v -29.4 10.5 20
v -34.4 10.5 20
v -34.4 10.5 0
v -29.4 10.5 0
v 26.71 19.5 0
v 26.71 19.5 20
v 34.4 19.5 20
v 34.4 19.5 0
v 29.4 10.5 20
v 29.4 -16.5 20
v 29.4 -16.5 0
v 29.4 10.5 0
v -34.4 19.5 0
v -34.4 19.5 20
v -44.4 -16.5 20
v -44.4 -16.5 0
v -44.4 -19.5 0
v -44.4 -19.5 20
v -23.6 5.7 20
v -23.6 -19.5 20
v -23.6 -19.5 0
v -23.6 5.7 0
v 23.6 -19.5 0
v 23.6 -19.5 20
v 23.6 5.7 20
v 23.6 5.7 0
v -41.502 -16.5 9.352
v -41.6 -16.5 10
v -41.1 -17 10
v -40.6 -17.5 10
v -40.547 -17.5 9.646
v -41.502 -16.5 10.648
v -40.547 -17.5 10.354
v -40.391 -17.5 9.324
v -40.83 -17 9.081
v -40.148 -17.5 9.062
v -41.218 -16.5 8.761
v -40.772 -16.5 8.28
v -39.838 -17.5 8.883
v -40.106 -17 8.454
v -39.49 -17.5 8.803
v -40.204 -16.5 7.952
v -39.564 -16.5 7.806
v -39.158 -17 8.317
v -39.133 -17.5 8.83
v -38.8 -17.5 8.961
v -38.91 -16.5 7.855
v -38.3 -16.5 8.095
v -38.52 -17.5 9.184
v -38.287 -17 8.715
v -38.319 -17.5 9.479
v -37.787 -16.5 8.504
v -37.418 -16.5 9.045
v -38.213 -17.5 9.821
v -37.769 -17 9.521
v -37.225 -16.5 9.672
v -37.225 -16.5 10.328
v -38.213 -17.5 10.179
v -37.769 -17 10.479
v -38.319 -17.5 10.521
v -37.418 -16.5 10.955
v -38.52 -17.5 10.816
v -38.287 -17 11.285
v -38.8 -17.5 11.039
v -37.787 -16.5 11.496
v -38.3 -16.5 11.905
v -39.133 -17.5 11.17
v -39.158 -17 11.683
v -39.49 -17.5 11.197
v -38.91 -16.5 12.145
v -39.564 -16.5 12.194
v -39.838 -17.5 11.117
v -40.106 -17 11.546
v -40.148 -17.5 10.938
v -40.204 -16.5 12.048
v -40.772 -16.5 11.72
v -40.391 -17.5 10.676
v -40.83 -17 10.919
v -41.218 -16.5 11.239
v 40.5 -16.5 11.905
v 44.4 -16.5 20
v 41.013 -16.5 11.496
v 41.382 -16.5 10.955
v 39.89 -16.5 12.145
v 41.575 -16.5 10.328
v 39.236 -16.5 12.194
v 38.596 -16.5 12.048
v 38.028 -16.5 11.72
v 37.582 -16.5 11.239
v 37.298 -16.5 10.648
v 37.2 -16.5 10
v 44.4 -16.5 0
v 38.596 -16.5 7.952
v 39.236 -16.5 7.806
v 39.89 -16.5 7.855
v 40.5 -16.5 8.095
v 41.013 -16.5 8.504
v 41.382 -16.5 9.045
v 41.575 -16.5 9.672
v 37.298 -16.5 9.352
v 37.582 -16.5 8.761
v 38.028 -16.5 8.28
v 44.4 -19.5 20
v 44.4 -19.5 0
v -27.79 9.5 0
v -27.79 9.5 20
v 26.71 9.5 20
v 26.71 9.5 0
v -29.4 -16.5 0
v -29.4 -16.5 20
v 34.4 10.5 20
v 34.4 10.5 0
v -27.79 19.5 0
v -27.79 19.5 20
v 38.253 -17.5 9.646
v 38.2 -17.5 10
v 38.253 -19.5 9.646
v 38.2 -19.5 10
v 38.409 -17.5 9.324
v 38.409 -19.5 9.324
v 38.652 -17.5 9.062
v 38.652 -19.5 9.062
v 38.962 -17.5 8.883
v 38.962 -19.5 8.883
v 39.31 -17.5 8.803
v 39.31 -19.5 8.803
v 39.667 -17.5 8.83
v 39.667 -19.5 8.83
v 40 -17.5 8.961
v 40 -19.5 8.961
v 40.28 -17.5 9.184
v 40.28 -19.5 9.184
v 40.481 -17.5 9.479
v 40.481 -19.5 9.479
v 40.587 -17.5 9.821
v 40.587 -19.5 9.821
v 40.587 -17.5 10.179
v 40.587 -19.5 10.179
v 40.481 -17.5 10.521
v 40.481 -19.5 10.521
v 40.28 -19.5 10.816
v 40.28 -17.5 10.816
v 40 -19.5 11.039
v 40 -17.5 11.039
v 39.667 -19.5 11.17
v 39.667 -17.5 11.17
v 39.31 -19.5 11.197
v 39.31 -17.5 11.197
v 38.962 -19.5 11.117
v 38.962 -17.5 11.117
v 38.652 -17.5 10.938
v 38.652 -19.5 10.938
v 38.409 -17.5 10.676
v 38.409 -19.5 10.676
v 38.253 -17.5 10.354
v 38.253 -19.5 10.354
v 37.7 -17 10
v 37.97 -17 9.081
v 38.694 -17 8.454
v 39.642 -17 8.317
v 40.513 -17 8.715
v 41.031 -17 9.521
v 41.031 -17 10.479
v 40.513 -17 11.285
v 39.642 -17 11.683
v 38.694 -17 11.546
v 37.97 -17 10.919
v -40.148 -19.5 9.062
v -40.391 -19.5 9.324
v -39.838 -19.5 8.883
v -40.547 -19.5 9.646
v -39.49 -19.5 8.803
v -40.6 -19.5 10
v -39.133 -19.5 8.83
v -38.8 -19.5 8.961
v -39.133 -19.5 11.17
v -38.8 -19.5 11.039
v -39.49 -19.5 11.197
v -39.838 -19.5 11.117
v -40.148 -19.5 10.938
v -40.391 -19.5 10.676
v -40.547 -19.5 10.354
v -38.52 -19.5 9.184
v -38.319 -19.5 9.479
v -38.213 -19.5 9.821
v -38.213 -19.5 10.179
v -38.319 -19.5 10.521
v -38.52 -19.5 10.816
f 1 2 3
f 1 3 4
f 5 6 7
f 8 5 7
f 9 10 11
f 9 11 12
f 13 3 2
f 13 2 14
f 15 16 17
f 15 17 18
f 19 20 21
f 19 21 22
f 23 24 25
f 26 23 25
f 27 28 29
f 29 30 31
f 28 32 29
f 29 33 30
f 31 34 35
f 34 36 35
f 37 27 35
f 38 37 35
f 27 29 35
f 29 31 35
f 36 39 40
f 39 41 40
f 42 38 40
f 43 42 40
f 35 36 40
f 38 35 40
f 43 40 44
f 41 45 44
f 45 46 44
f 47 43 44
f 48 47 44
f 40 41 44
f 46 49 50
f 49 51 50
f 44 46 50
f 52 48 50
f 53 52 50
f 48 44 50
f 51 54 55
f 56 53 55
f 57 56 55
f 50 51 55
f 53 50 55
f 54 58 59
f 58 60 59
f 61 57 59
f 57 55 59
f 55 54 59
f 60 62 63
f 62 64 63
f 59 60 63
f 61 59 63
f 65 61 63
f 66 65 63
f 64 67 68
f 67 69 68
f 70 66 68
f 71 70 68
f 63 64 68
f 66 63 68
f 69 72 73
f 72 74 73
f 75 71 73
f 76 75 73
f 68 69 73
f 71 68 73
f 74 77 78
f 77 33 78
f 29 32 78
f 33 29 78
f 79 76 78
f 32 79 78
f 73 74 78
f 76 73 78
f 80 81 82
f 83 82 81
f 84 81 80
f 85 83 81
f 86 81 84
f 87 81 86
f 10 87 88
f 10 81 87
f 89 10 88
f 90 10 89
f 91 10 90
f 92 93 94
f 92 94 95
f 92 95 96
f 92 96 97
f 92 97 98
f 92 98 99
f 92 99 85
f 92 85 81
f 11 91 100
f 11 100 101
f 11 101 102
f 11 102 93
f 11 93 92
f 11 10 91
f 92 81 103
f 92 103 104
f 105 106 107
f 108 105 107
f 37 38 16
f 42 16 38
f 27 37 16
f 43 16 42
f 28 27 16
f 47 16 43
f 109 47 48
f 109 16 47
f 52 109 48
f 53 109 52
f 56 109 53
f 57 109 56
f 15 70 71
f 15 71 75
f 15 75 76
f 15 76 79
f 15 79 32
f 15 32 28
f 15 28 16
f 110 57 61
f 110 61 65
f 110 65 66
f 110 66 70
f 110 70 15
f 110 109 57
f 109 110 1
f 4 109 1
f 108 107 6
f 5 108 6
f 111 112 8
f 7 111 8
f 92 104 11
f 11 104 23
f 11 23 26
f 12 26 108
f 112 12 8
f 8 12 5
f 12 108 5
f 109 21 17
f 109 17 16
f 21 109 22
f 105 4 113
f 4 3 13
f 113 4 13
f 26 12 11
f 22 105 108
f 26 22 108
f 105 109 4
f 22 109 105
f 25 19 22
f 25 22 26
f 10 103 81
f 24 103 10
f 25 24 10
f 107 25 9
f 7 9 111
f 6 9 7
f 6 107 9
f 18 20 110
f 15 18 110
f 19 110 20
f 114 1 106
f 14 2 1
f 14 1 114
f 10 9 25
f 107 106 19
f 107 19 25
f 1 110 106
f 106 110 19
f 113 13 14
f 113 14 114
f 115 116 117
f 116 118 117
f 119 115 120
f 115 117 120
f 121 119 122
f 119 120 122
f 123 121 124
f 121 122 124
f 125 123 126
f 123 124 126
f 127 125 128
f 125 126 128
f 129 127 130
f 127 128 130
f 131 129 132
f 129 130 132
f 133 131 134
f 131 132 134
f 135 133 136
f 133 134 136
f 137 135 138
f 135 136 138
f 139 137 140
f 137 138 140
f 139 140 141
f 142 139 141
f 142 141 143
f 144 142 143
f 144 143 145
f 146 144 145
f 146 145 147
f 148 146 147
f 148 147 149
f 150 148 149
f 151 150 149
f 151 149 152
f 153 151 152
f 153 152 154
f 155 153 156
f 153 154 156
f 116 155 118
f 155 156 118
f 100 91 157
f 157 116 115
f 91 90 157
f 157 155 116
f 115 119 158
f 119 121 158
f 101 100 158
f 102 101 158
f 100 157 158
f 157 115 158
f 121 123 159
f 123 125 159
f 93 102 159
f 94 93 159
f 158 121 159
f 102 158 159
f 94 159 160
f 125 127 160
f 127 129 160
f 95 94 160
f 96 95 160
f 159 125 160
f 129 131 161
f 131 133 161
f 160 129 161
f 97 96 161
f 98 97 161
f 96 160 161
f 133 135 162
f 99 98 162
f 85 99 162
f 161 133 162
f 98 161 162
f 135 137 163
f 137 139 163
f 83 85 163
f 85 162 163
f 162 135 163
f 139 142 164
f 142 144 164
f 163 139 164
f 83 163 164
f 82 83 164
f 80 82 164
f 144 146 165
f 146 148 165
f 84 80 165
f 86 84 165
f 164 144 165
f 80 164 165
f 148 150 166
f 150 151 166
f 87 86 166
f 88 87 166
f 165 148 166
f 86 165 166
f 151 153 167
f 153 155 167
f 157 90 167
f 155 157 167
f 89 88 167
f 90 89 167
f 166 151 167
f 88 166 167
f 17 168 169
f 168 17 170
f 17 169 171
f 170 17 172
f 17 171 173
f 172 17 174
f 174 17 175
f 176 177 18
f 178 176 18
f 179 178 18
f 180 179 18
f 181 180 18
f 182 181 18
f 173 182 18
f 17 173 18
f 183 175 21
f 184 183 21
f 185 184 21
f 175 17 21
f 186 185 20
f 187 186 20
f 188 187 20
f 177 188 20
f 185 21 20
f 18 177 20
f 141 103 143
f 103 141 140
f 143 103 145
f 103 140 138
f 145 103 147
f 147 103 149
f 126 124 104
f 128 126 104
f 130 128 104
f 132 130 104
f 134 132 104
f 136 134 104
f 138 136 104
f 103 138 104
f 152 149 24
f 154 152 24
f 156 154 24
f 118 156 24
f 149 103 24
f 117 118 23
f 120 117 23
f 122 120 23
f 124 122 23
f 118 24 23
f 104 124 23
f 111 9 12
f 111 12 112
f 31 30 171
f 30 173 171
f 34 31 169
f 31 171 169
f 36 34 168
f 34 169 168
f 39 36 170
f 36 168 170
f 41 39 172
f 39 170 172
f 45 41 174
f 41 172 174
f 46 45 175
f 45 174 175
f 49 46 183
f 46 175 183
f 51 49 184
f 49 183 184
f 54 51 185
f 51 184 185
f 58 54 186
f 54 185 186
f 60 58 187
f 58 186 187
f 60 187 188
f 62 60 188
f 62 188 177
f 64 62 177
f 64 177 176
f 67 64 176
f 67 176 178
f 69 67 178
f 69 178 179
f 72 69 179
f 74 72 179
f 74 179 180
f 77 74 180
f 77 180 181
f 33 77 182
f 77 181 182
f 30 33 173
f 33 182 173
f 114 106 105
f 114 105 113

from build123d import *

# Parameters (mm, degrees)
SKETCH1_W                                       = 68.8
SKETCH1_H                                       = 39
BOSS_EXTRUDE1_DEPTH                             = 20
SKETCH2_W                                       = 47.2
SKETCH2_H                                       = 25.2
SKETCH2_W_2                                     = 54.5
SKETCH2_H_2                                     = 10
CUT_EXTRUDE1_DEPTH                              = 50
SKETCH3_W                                       = 5
SKETCH3_H                                       = 30
CUT_EXTRUDE2_DEPTH                              = 50
SKETCH4_W                                       = 20
SKETCH4_H                                       = 3
BOSS_EXTRUDE2_DEPTH                             = 15
SKETCH5_W                                       = 20
SKETCH5_H                                       = 3
BOSS_EXTRUDE3_DEPTH                             = 15
CSK_FOR_M2_FLAT_HEAD_MACHINE_SCREW1_D           = 2.4
CSK_FOR_M2_FLAT_HEAD_MACHINE_SCREW1_CSINK_D     = 4.4
CSK_FOR_M2_FLAT_HEAD_MACHINE_SCREW1_CSINK_ANGLE = 90
CSK_FOR_M2_FLAT_HEAD_MACHINE_SCREW2_D           = 2.4
CSK_FOR_M2_FLAT_HEAD_MACHINE_SCREW2_CSINK_D     = 4.4
CSK_FOR_M2_FLAT_HEAD_MACHINE_SCREW2_CSINK_ANGLE = 90


with BuildPart() as part:
    # Sketch1 → Boss-Extrude1 (new body)
    with BuildSketch(Plane.XY):
        Rectangle(SKETCH1_W, SKETCH1_H)
    extrude(amount=BOSS_EXTRUDE1_DEPTH)

    # Sketch2 → Cut-Extrude1 (cut)
    with BuildSketch(Plane.XY.offset(20)):
        with Locations((0, -6.9)):
            Rectangle(SKETCH2_W, SKETCH2_H)
        with Locations((-0.54, 14.5)):
            Rectangle(SKETCH2_W_2, SKETCH2_H_2)
    extrude(amount=-CUT_EXTRUDE1_DEPTH, mode=Mode.SUBTRACT)

    # Sketch3 → Cut-Extrude2 (cut)
    with BuildSketch(Plane.XY.offset(20)):
        with Locations((-31.9, -4.5)):
            Rectangle(SKETCH3_W, SKETCH3_H)
        with Locations((31.9, -4.5)):
            Rectangle(SKETCH3_W, SKETCH3_H)
    extrude(amount=-CUT_EXTRUDE2_DEPTH, mode=Mode.SUBTRACT)

    # Sketch4 → Boss-Extrude2 (add)
    with BuildSketch(Plane.ZY.offset(29.4)):
        with Locations((10, -18)):
            Rectangle(SKETCH4_W, SKETCH4_H)
    extrude(amount=BOSS_EXTRUDE2_DEPTH)

    # Sketch5 → Boss-Extrude3 (add)
    with BuildSketch(Plane(origin=(29.4, 0, 0), x_dir=(0, 0, -1), z_dir=(1, 0, 0))):
        with Locations((-10, -18)):
            Rectangle(SKETCH5_W, SKETCH5_H)
    extrude(amount=BOSS_EXTRUDE3_DEPTH)

    # CSK for M2 Flat Head Machine Screw1 (through all)
    with Locations(Plane(origin=(0, -16.5, 0), x_dir=(1, 0, 0), z_dir=(0, 1, 0))):
        with Locations((-39.4, -10)):
            CounterSinkHole(CSK_FOR_M2_FLAT_HEAD_MACHINE_SCREW1_D / 2, CSK_FOR_M2_FLAT_HEAD_MACHINE_SCREW1_CSINK_D / 2, counter_sink_angle=CSK_FOR_M2_FLAT_HEAD_MACHINE_SCREW1_CSINK_ANGLE)

    # CSK for M2 Flat Head Machine Screw2 (through all)
    with Locations(Plane(origin=(0, -16.5, 0), x_dir=(1, 0, 0), z_dir=(0, 1, 0))):
        with Locations((39.4, -10)):
            CounterSinkHole(CSK_FOR_M2_FLAT_HEAD_MACHINE_SCREW2_D / 2, CSK_FOR_M2_FLAT_HEAD_MACHINE_SCREW2_CSINK_D / 2, counter_sink_angle=CSK_FOR_M2_FLAT_HEAD_MACHINE_SCREW2_CSINK_ANGLE)


solid = part.part
